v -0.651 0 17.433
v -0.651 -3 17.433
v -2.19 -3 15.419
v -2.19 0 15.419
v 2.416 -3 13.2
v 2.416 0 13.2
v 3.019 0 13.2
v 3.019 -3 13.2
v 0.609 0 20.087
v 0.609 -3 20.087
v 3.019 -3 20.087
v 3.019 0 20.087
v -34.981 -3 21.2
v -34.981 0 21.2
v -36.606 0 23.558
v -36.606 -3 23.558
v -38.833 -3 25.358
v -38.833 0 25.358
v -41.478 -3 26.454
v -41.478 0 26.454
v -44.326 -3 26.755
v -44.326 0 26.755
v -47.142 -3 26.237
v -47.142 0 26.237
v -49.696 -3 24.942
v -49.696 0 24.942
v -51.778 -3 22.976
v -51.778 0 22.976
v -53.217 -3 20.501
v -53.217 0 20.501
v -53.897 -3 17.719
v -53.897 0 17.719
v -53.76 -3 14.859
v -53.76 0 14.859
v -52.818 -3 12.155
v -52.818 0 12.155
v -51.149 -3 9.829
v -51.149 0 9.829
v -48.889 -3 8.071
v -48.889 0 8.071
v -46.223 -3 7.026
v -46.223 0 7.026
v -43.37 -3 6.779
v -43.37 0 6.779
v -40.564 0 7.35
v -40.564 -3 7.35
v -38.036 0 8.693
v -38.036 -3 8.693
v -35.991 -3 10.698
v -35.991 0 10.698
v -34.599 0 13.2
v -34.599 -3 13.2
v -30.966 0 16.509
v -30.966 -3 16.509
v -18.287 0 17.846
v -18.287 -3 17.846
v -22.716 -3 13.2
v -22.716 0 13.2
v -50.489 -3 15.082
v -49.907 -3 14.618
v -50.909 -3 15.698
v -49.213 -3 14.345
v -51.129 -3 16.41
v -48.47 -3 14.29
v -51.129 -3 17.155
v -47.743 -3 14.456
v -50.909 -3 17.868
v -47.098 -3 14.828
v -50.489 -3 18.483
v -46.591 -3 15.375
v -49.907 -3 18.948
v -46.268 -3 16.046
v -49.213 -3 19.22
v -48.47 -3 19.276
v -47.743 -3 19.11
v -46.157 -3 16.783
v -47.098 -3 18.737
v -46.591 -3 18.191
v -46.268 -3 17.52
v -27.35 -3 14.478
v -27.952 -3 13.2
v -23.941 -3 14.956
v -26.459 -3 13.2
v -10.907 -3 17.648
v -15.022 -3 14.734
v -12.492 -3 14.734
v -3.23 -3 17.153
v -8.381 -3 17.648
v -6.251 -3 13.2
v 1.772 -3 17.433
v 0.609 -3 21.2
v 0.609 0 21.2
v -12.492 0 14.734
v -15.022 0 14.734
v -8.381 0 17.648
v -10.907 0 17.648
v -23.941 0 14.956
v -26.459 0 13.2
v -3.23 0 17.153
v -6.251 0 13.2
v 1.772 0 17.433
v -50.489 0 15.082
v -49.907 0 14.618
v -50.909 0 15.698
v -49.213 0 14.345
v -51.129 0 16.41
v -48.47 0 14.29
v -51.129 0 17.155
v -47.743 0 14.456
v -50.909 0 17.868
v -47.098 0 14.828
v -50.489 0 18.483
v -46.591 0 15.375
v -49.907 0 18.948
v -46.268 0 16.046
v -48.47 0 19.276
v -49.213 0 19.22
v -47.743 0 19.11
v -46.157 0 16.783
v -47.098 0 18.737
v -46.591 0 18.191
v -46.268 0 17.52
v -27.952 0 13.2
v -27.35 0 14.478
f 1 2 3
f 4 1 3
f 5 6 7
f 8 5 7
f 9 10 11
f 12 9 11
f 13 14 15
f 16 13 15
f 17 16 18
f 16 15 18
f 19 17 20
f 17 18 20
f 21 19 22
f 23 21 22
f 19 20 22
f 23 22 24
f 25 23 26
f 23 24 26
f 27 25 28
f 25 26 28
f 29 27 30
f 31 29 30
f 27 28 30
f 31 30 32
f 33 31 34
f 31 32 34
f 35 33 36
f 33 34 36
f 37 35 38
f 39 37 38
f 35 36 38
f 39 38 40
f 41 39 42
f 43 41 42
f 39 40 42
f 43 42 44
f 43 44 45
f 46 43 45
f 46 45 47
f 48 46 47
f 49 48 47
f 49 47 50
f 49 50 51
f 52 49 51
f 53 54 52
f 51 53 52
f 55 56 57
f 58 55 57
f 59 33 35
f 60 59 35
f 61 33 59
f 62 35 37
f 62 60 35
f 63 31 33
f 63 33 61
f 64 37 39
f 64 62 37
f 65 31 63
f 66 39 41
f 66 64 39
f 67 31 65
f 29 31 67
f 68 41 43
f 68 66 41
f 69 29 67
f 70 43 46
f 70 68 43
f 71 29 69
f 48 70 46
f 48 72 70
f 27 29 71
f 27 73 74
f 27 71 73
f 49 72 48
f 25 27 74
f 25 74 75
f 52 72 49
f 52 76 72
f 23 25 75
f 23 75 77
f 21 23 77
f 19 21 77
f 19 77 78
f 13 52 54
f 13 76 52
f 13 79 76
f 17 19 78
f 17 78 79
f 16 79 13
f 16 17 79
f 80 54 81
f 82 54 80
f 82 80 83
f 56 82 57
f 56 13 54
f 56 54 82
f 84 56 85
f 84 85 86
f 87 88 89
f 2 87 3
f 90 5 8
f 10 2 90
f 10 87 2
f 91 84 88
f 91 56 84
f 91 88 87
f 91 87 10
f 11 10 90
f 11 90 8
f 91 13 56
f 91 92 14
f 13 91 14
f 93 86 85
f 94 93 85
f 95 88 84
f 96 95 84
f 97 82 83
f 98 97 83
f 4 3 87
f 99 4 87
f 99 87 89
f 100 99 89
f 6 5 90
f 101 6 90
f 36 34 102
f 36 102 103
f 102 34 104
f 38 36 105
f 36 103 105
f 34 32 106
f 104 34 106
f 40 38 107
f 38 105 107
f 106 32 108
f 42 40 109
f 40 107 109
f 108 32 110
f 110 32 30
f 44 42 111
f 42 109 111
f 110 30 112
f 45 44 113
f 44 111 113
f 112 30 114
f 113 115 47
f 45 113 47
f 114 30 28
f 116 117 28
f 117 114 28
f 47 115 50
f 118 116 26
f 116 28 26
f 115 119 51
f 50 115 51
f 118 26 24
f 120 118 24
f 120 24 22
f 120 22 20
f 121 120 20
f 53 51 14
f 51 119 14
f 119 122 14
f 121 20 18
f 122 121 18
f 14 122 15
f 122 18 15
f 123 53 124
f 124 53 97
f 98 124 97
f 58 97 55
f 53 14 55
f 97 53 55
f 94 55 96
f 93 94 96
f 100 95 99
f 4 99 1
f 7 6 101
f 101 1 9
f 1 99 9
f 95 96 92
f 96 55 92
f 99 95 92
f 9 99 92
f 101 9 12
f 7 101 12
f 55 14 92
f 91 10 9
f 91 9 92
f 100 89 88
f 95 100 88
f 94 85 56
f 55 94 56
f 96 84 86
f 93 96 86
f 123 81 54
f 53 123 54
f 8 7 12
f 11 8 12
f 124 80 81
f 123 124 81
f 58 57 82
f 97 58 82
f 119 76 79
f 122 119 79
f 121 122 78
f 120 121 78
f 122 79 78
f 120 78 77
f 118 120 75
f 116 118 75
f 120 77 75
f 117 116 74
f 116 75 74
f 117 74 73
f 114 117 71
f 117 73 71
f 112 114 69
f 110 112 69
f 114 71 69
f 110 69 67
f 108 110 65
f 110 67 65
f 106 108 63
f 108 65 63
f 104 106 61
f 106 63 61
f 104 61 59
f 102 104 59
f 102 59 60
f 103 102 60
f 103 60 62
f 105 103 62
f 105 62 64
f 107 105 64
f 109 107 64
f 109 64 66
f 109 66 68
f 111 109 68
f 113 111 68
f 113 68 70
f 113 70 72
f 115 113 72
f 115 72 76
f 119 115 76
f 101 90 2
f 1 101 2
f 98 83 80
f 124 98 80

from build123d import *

# Parameters (mm, degrees)
F1_DEPTH = 3
F3_DEPTH = 25
F4_W     = 3.49161
F4_H     = 1.112773
F5_DEPTH = 25
F6_R     = 2.5
F7_DEPTH = 25


with BuildPart() as f1:
    # F0 (on Front) → F1 (new body)
    with BuildSketch(Plane.XZ):
        with BuildLine():
            ThreePointArc((-34.598693, 13.199997), (-34.108076, 14.95115), (-33.942714, 16.762199))
            ThreePointArc((-33.942714, 16.762199), (-34.205836, 19.04106), (-34.981355, 21.199997))
            ThreePointArc((-34.981355, 21.199997), (-53.931293, 16.284418), (-34.598693, 13.199997))
        make_face()
        with BuildLine():
            ThreePointArc((-34.981355, 21.199997), (-34.205836, 19.04106), (-33.942714, 16.762199))
            ThreePointArc((-33.942714, 16.762199), (-34.108076, 14.95115), (-34.598693, 13.199997))
            Line((-34.598693, 13.199997), (3.018645, 13.199997))
            Line((3.018645, 13.199997), (3.018645, 21.199997))
            Line((3.018645, 21.199997), (-34.981355, 21.199997))
        make_face()
    extrude(amount=F1_DEPTH)

    # F2 (on face) → F3 (cut)
    with BuildSketch(Plane.XZ.offset(3)):
        Polygon((-30.966062, 16.508911), (-34.598693, 13.199997), (-27.952018, 13.199997), align=None)
        Polygon((-27.350497, 14.478252), (-27.952018, 13.199997), (-26.458988, 13.199997), align=None)
        Polygon((-23.940648, 14.956392), (-26.458988, 13.199997), (-22.715665, 13.199997), align=None)
        Polygon((-18.286822, 17.846175), (-22.715665, 13.199997), (-6.251452, 13.199997), (-8.381168, 17.648062), (-10.90711, 17.648062), (-12.492014, 14.733944), (-15.021867, 14.733944), align=None)
        Polygon((-6.251452, 13.199997), (2.415996, 13.199997), (1.772129, 17.432725), (-0.651208, 17.432725), (-2.190134, 15.419289), (-3.230228, 17.152779), align=None)
    extrude(amount=-F3_DEPTH, mode=Mode.SUBTRACT)

    # F4 (on face) → F5 (cut)
    with BuildSketch(Plane.XZ.offset(3)):
        with Locations((2.354657, 20.643611)):
            Rectangle(F4_W, F4_H)
    extrude(amount=-F5_DEPTH, mode=Mode.SUBTRACT)

    # F6 (on face) → F7 (cut)
    with BuildSketch(Plane.XZ.offset(3)):
        with Locations((-48.656683, 16.782803)):
            Circle(F6_R)
    extrude(amount=-F7_DEPTH, mode=Mode.SUBTRACT)


solid = f1.part
